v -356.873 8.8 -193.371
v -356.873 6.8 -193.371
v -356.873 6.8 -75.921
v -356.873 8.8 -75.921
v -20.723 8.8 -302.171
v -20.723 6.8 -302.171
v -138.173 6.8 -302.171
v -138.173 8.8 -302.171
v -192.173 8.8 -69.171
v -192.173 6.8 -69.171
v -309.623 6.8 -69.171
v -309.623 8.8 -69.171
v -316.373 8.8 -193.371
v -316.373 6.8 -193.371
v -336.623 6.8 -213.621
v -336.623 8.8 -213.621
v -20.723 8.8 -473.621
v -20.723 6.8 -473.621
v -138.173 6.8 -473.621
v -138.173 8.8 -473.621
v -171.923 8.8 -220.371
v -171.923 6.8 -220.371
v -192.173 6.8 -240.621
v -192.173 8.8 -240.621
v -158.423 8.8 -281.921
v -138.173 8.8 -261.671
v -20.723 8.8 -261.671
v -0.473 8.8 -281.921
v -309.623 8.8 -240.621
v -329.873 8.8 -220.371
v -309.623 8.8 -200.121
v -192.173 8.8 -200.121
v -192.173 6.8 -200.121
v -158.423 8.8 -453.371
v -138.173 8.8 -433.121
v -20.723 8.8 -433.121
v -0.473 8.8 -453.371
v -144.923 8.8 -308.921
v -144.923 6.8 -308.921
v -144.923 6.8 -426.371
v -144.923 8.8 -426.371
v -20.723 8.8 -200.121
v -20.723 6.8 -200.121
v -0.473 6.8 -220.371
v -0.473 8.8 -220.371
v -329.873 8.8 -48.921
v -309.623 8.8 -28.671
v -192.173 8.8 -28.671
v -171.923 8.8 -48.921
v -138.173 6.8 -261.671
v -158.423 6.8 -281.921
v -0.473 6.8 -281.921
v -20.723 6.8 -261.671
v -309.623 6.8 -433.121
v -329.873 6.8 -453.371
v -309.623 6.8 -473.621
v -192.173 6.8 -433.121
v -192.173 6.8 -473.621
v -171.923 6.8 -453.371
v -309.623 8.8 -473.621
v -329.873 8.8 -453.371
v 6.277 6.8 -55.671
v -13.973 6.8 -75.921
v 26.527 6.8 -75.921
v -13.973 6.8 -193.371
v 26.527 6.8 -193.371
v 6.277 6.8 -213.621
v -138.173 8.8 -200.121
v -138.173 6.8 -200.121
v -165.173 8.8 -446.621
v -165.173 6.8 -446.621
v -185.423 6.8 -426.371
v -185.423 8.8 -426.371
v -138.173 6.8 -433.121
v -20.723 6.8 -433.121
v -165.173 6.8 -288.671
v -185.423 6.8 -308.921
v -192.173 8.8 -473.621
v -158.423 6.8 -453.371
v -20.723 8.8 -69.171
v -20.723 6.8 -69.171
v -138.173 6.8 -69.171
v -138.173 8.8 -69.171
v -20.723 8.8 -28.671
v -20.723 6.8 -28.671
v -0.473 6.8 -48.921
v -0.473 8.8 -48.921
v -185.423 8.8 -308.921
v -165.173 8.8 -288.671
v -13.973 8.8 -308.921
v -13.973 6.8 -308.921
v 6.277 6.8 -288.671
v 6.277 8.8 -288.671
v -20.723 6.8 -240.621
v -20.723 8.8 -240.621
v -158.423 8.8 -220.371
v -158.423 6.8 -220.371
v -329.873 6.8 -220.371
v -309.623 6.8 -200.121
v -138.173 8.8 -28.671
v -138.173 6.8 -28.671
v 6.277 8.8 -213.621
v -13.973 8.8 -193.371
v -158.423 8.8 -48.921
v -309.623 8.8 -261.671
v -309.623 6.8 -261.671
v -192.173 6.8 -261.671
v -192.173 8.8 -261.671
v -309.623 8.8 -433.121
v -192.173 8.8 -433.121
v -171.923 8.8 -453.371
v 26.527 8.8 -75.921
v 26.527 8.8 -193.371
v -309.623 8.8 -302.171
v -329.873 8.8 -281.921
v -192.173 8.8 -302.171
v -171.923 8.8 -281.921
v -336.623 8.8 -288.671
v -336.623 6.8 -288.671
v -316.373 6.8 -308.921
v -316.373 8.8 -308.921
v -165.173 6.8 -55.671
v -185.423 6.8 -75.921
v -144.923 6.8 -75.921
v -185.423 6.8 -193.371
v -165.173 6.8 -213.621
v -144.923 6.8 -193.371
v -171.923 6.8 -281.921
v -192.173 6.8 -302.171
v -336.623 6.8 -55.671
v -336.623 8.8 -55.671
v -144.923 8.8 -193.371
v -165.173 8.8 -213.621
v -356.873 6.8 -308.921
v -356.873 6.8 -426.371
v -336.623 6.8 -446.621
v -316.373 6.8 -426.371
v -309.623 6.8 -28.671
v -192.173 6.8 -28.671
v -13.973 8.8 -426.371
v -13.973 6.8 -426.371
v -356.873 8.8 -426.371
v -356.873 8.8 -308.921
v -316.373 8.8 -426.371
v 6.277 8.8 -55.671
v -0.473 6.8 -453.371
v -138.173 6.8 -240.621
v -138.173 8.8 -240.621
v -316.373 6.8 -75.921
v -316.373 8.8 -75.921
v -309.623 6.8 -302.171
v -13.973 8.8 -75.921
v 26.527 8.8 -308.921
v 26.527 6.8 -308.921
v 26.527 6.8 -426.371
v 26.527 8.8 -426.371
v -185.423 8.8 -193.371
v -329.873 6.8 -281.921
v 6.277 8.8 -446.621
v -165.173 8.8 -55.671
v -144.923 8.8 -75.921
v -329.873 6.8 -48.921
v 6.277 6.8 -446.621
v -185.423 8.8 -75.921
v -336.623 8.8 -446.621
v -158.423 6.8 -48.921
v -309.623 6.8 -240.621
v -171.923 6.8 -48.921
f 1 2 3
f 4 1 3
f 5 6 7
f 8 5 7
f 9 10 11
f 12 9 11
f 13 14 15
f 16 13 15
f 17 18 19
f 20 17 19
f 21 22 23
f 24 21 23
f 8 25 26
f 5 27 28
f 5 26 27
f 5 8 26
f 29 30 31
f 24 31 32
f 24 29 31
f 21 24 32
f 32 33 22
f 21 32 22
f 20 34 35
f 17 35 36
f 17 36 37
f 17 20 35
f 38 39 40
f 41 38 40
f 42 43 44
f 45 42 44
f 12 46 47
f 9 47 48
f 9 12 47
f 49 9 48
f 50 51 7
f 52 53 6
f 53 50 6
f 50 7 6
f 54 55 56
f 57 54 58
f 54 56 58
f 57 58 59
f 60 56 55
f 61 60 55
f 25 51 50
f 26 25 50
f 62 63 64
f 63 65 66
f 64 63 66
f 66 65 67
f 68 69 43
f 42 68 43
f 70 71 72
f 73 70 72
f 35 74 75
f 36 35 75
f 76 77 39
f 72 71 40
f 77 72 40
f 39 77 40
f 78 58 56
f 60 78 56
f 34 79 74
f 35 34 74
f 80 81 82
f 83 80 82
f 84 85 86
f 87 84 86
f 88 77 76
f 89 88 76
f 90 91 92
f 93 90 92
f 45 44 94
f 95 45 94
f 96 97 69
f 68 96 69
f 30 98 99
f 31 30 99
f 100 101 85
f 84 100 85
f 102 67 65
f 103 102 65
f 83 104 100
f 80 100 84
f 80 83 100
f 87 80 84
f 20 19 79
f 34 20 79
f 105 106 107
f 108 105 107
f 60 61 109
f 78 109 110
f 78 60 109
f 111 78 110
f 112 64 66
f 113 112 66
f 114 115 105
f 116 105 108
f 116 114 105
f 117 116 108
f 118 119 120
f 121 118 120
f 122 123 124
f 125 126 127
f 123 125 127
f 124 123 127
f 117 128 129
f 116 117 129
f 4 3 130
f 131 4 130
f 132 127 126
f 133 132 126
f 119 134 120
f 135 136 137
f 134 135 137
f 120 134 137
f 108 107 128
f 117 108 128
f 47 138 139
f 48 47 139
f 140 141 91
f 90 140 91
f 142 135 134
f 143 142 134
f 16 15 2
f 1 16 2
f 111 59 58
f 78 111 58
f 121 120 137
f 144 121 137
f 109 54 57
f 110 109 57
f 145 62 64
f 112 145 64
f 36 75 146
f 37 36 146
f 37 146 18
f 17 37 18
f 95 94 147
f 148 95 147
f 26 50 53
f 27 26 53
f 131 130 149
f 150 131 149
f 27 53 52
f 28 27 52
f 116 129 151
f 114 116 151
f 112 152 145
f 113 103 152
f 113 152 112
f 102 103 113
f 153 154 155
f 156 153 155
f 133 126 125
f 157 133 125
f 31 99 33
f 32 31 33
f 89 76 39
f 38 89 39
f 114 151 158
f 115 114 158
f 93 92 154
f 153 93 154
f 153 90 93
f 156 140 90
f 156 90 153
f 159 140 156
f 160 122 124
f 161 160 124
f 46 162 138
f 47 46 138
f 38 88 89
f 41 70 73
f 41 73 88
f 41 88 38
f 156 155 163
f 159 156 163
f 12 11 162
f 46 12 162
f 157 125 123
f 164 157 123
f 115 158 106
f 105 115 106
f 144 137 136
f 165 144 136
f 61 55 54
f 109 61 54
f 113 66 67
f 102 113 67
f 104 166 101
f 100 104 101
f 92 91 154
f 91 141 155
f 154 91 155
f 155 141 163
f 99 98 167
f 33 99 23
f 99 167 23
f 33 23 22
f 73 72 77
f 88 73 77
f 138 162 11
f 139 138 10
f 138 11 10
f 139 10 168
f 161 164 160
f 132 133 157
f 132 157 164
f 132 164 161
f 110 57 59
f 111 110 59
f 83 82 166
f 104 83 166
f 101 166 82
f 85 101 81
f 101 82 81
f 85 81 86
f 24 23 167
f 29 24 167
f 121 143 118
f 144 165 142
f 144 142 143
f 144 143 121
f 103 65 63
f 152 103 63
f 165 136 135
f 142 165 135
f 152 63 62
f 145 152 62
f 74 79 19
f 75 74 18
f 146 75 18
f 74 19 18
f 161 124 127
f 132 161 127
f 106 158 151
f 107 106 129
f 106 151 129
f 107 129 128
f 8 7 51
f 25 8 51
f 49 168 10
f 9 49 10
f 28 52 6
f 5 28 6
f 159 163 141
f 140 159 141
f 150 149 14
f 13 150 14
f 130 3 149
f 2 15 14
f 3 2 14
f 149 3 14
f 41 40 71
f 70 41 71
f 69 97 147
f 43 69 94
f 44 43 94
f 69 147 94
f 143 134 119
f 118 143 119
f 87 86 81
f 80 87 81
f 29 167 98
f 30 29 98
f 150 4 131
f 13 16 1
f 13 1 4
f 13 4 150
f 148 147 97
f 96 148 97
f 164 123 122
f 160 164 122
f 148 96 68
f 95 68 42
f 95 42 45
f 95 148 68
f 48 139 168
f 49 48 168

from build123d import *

# Parameters (mm, degrees)
RESSALTO_EXTRUS_O1_DEPTH    = 2
RESSALTO_EXTRUS_O1_2_DEPTH  = 2
RESSALTO_EXTRUS_O1_3_DEPTH  = 2
RESSALTO_EXTRUS_O1_4_DEPTH  = 2
RESSALTO_EXTRUS_O1_5_DEPTH  = 2
RESSALTO_EXTRUS_O1_6_DEPTH  = 2
RESSALTO_EXTRUS_O1_7_DEPTH  = 2
RESSALTO_EXTRUS_O1_8_DEPTH  = 2
RESSALTO_EXTRUS_O1_9_DEPTH  = 2
RESSALTO_EXTRUS_O1_10_DEPTH = 2
RESSALTO_EXTRUS_O1_11_DEPTH = 2
RESSALTO_EXTRUS_O1_12_DEPTH = 2
RESSALTO_EXTRUS_O1_13_DEPTH = 2
RESSALTO_EXTRUS_O1_14_DEPTH = 2


with BuildPart() as part:
    # Esboço1 → Ressalto-extrusão1 (new body)
    with BuildSketch(Plane(origin=(0, 6.8, 0), x_dir=(1, 0, 0), z_dir=(0, 1, 0))):
        Polygon((-165.173134603, 288.671451709), (-144.923134603, 308.921451709), (-144.923134603, 426.371451709), (-165.173134603, 446.621451709), (-185.423134603, 426.371451709), (-185.423134603, 308.921451709), align=None)
    extrude(amount=RESSALTO_EXTRUS_O1_DEPTH)


with BuildPart() as body_2:
    # Esboço1 → Ressalto-extrus_o1 2 (new body)
    with BuildSketch(Plane(origin=(0, 6.8, 0), x_dir=(1, 0, 0), z_dir=(0, 1, 0))):
        Polygon((-309.623134603, 261.671451709), (-192.173134603, 261.671451709), (-171.923134603, 281.921451709), (-192.173134603, 302.171451709), (-309.623134603, 302.171451709), (-329.873134603, 281.921451709), align=None)
    extrude(amount=RESSALTO_EXTRUS_O1_2_DEPTH)


with BuildPart() as body_3:
    # Esboço1 → Ressalto-extrus_o1 3 (new body)
    with BuildSketch(Plane(origin=(0, 6.8, 0), x_dir=(1, 0, 0), z_dir=(0, 1, 0))):
        Polygon((-192.173134603, 473.621451709), (-309.623134603, 473.621451709), (-329.873134603, 453.371451709), (-309.623134603, 433.121451709), (-192.173134603, 433.121451709), (-171.923134603, 453.371451709), align=None)
    extrude(amount=RESSALTO_EXTRUS_O1_3_DEPTH)


with BuildPart() as body_4:
    # Esboço1 → Ressalto-extrus_o1 4 (new body)
    with BuildSketch(Plane(origin=(0, 6.8, 0), x_dir=(1, 0, 0), z_dir=(0, 1, 0))):
        Polygon((-336.623134603, 446.621451709), (-356.873134603, 426.371451709), (-356.873134603, 308.921451709), (-336.623134603, 288.671451709), (-316.373134603, 308.921451709), (-316.373134603, 426.371451709), align=None)
    extrude(amount=RESSALTO_EXTRUS_O1_4_DEPTH)


with BuildPart() as body_5:
    # Esboço1 → Ressalto-extrus_o1 5 (new body)
    with BuildSketch(Plane(origin=(0, 6.8, 0), x_dir=(1, 0, 0), z_dir=(0, 1, 0))):
        Polygon((-0.473134603, 453.371451709), (-20.723134603, 473.621451709), (-138.173134603, 473.621451709), (-158.423134603, 453.371451709), (-138.173134603, 433.121451709), (-20.723134603, 433.121451709), align=None)
    extrude(amount=RESSALTO_EXTRUS_O1_5_DEPTH)


with BuildPart() as body_6:
    # Esboço1 → Ressalto-extrus_o1 6 (new body)
    with BuildSketch(Plane(origin=(0, 6.8, 0), x_dir=(1, 0, 0), z_dir=(0, 1, 0))):
        Polygon((26.526865397, 308.921451709), (26.526865397, 426.371451709), (6.276865397, 446.621451709), (-13.973134603, 426.371451709), (-13.973134603, 308.921451709), (6.276865397, 288.671451709), align=None)
    extrude(amount=RESSALTO_EXTRUS_O1_6_DEPTH)


with BuildPart() as body_7:
    # Esboço1 → Ressalto-extrus_o1 7 (new body)
    with BuildSketch(Plane(origin=(0, 6.8, 0), x_dir=(1, 0, 0), z_dir=(0, 1, 0))):
        Polygon((-20.723134603, 261.671451709), (-0.473134603, 281.921451709), (-20.723134603, 302.171451709), (-138.173134603, 302.171451709), (-158.423134603, 281.921451709), (-138.173134603, 261.671451709), align=None)
    extrude(amount=RESSALTO_EXTRUS_O1_7_DEPTH)


with BuildPart() as body_8:
    # Esboço1 → Ressalto-extrus_o1 8 (new body)
    with BuildSketch(Plane(origin=(0, 6.8, 0), x_dir=(1, 0, 0), z_dir=(0, 1, 0))):
        Polygon((-165.173134603, 55.671451709), (-144.923134603, 75.921451709), (-144.923134603, 193.371451709), (-165.173134603, 213.621451709), (-185.423134603, 193.371451709), (-185.423134603, 75.921451709), align=None)
    extrude(amount=RESSALTO_EXTRUS_O1_8_DEPTH)


with BuildPart() as body_9:
    # Esboço1 → Ressalto-extrus_o1 9 (new body)
    with BuildSketch(Plane(origin=(0, 6.8, 0), x_dir=(1, 0, 0), z_dir=(0, 1, 0))):
        Polygon((-309.623134603, 28.671451709), (-192.173134603, 28.671451709), (-171.923134603, 48.921451709), (-192.173134603, 69.171451709), (-309.623134603, 69.171451709), (-329.873134603, 48.921451709), align=None)
    extrude(amount=RESSALTO_EXTRUS_O1_9_DEPTH)


with BuildPart() as body_10:
    # Esboço1 → Ressalto-extrus_o1 10 (new body)
    with BuildSketch(Plane(origin=(0, 6.8, 0), x_dir=(1, 0, 0), z_dir=(0, 1, 0))):
        Polygon((-192.173134603, 240.621451709), (-309.623134603, 240.621451709), (-329.873134603, 220.371451709), (-309.623134603, 200.121451709), (-192.173134603, 200.121451709), (-171.923134603, 220.371451709), align=None)
    extrude(amount=RESSALTO_EXTRUS_O1_10_DEPTH)


with BuildPart() as body_11:
    # Esboço1 → Ressalto-extrus_o1 11 (new body)
    with BuildSketch(Plane(origin=(0, 6.8, 0), x_dir=(1, 0, 0), z_dir=(0, 1, 0))):
        Polygon((-336.623134603, 213.621451709), (-356.873134603, 193.371451709), (-356.873134603, 75.921451709), (-336.623134603, 55.671451709), (-316.373134603, 75.921451709), (-316.373134603, 193.371451709), align=None)
    extrude(amount=RESSALTO_EXTRUS_O1_11_DEPTH)


with BuildPart() as body_12:
    # Esboço1 → Ressalto-extrus_o1 12 (new body)
    with BuildSketch(Plane(origin=(0, 6.8, 0), x_dir=(1, 0, 0), z_dir=(0, 1, 0))):
        Polygon((-0.473134603, 220.371451709), (-20.723134603, 240.621451709), (-138.173134603, 240.621451709), (-158.423134603, 220.371451709), (-138.173134603, 200.121451709), (-20.723134603, 200.121451709), align=None)
    extrude(amount=RESSALTO_EXTRUS_O1_12_DEPTH)


with BuildPart() as body_13:
    # Esboço1 → Ressalto-extrus_o1 13 (new body)
    with BuildSketch(Plane(origin=(0, 6.8, 0), x_dir=(1, 0, 0), z_dir=(0, 1, 0))):
        Polygon((26.526865397, 75.921451709), (26.526865397, 193.371451709), (6.276865397, 213.621451709), (-13.973134603, 193.371451709), (-13.973134603, 75.921451709), (6.276865397, 55.671451709), align=None)
    extrude(amount=RESSALTO_EXTRUS_O1_13_DEPTH)


with BuildPart() as body_14:
    # Esboço1 → Ressalto-extrus_o1 14 (new body)
    with BuildSketch(Plane(origin=(0, 6.8, 0), x_dir=(1, 0, 0), z_dir=(0, 1, 0))):
        Polygon((-20.723134603, 28.671451709), (-0.473134603, 48.921451709), (-20.723134603, 69.171451709), (-138.173134603, 69.171451709), (-158.423134603, 48.921451709), (-138.173134603, 28.671451709), align=None)
    extrude(amount=RESSALTO_EXTRUS_O1_14_DEPTH)


solid = Compound([part.part, body_2.part, body_3.part, body_4.part, body_5.part, body_6.part, body_7.part, body_8.part, body_9.part, body_10.part, body_11.part, body_12.part, body_13.part, body_14.part])
